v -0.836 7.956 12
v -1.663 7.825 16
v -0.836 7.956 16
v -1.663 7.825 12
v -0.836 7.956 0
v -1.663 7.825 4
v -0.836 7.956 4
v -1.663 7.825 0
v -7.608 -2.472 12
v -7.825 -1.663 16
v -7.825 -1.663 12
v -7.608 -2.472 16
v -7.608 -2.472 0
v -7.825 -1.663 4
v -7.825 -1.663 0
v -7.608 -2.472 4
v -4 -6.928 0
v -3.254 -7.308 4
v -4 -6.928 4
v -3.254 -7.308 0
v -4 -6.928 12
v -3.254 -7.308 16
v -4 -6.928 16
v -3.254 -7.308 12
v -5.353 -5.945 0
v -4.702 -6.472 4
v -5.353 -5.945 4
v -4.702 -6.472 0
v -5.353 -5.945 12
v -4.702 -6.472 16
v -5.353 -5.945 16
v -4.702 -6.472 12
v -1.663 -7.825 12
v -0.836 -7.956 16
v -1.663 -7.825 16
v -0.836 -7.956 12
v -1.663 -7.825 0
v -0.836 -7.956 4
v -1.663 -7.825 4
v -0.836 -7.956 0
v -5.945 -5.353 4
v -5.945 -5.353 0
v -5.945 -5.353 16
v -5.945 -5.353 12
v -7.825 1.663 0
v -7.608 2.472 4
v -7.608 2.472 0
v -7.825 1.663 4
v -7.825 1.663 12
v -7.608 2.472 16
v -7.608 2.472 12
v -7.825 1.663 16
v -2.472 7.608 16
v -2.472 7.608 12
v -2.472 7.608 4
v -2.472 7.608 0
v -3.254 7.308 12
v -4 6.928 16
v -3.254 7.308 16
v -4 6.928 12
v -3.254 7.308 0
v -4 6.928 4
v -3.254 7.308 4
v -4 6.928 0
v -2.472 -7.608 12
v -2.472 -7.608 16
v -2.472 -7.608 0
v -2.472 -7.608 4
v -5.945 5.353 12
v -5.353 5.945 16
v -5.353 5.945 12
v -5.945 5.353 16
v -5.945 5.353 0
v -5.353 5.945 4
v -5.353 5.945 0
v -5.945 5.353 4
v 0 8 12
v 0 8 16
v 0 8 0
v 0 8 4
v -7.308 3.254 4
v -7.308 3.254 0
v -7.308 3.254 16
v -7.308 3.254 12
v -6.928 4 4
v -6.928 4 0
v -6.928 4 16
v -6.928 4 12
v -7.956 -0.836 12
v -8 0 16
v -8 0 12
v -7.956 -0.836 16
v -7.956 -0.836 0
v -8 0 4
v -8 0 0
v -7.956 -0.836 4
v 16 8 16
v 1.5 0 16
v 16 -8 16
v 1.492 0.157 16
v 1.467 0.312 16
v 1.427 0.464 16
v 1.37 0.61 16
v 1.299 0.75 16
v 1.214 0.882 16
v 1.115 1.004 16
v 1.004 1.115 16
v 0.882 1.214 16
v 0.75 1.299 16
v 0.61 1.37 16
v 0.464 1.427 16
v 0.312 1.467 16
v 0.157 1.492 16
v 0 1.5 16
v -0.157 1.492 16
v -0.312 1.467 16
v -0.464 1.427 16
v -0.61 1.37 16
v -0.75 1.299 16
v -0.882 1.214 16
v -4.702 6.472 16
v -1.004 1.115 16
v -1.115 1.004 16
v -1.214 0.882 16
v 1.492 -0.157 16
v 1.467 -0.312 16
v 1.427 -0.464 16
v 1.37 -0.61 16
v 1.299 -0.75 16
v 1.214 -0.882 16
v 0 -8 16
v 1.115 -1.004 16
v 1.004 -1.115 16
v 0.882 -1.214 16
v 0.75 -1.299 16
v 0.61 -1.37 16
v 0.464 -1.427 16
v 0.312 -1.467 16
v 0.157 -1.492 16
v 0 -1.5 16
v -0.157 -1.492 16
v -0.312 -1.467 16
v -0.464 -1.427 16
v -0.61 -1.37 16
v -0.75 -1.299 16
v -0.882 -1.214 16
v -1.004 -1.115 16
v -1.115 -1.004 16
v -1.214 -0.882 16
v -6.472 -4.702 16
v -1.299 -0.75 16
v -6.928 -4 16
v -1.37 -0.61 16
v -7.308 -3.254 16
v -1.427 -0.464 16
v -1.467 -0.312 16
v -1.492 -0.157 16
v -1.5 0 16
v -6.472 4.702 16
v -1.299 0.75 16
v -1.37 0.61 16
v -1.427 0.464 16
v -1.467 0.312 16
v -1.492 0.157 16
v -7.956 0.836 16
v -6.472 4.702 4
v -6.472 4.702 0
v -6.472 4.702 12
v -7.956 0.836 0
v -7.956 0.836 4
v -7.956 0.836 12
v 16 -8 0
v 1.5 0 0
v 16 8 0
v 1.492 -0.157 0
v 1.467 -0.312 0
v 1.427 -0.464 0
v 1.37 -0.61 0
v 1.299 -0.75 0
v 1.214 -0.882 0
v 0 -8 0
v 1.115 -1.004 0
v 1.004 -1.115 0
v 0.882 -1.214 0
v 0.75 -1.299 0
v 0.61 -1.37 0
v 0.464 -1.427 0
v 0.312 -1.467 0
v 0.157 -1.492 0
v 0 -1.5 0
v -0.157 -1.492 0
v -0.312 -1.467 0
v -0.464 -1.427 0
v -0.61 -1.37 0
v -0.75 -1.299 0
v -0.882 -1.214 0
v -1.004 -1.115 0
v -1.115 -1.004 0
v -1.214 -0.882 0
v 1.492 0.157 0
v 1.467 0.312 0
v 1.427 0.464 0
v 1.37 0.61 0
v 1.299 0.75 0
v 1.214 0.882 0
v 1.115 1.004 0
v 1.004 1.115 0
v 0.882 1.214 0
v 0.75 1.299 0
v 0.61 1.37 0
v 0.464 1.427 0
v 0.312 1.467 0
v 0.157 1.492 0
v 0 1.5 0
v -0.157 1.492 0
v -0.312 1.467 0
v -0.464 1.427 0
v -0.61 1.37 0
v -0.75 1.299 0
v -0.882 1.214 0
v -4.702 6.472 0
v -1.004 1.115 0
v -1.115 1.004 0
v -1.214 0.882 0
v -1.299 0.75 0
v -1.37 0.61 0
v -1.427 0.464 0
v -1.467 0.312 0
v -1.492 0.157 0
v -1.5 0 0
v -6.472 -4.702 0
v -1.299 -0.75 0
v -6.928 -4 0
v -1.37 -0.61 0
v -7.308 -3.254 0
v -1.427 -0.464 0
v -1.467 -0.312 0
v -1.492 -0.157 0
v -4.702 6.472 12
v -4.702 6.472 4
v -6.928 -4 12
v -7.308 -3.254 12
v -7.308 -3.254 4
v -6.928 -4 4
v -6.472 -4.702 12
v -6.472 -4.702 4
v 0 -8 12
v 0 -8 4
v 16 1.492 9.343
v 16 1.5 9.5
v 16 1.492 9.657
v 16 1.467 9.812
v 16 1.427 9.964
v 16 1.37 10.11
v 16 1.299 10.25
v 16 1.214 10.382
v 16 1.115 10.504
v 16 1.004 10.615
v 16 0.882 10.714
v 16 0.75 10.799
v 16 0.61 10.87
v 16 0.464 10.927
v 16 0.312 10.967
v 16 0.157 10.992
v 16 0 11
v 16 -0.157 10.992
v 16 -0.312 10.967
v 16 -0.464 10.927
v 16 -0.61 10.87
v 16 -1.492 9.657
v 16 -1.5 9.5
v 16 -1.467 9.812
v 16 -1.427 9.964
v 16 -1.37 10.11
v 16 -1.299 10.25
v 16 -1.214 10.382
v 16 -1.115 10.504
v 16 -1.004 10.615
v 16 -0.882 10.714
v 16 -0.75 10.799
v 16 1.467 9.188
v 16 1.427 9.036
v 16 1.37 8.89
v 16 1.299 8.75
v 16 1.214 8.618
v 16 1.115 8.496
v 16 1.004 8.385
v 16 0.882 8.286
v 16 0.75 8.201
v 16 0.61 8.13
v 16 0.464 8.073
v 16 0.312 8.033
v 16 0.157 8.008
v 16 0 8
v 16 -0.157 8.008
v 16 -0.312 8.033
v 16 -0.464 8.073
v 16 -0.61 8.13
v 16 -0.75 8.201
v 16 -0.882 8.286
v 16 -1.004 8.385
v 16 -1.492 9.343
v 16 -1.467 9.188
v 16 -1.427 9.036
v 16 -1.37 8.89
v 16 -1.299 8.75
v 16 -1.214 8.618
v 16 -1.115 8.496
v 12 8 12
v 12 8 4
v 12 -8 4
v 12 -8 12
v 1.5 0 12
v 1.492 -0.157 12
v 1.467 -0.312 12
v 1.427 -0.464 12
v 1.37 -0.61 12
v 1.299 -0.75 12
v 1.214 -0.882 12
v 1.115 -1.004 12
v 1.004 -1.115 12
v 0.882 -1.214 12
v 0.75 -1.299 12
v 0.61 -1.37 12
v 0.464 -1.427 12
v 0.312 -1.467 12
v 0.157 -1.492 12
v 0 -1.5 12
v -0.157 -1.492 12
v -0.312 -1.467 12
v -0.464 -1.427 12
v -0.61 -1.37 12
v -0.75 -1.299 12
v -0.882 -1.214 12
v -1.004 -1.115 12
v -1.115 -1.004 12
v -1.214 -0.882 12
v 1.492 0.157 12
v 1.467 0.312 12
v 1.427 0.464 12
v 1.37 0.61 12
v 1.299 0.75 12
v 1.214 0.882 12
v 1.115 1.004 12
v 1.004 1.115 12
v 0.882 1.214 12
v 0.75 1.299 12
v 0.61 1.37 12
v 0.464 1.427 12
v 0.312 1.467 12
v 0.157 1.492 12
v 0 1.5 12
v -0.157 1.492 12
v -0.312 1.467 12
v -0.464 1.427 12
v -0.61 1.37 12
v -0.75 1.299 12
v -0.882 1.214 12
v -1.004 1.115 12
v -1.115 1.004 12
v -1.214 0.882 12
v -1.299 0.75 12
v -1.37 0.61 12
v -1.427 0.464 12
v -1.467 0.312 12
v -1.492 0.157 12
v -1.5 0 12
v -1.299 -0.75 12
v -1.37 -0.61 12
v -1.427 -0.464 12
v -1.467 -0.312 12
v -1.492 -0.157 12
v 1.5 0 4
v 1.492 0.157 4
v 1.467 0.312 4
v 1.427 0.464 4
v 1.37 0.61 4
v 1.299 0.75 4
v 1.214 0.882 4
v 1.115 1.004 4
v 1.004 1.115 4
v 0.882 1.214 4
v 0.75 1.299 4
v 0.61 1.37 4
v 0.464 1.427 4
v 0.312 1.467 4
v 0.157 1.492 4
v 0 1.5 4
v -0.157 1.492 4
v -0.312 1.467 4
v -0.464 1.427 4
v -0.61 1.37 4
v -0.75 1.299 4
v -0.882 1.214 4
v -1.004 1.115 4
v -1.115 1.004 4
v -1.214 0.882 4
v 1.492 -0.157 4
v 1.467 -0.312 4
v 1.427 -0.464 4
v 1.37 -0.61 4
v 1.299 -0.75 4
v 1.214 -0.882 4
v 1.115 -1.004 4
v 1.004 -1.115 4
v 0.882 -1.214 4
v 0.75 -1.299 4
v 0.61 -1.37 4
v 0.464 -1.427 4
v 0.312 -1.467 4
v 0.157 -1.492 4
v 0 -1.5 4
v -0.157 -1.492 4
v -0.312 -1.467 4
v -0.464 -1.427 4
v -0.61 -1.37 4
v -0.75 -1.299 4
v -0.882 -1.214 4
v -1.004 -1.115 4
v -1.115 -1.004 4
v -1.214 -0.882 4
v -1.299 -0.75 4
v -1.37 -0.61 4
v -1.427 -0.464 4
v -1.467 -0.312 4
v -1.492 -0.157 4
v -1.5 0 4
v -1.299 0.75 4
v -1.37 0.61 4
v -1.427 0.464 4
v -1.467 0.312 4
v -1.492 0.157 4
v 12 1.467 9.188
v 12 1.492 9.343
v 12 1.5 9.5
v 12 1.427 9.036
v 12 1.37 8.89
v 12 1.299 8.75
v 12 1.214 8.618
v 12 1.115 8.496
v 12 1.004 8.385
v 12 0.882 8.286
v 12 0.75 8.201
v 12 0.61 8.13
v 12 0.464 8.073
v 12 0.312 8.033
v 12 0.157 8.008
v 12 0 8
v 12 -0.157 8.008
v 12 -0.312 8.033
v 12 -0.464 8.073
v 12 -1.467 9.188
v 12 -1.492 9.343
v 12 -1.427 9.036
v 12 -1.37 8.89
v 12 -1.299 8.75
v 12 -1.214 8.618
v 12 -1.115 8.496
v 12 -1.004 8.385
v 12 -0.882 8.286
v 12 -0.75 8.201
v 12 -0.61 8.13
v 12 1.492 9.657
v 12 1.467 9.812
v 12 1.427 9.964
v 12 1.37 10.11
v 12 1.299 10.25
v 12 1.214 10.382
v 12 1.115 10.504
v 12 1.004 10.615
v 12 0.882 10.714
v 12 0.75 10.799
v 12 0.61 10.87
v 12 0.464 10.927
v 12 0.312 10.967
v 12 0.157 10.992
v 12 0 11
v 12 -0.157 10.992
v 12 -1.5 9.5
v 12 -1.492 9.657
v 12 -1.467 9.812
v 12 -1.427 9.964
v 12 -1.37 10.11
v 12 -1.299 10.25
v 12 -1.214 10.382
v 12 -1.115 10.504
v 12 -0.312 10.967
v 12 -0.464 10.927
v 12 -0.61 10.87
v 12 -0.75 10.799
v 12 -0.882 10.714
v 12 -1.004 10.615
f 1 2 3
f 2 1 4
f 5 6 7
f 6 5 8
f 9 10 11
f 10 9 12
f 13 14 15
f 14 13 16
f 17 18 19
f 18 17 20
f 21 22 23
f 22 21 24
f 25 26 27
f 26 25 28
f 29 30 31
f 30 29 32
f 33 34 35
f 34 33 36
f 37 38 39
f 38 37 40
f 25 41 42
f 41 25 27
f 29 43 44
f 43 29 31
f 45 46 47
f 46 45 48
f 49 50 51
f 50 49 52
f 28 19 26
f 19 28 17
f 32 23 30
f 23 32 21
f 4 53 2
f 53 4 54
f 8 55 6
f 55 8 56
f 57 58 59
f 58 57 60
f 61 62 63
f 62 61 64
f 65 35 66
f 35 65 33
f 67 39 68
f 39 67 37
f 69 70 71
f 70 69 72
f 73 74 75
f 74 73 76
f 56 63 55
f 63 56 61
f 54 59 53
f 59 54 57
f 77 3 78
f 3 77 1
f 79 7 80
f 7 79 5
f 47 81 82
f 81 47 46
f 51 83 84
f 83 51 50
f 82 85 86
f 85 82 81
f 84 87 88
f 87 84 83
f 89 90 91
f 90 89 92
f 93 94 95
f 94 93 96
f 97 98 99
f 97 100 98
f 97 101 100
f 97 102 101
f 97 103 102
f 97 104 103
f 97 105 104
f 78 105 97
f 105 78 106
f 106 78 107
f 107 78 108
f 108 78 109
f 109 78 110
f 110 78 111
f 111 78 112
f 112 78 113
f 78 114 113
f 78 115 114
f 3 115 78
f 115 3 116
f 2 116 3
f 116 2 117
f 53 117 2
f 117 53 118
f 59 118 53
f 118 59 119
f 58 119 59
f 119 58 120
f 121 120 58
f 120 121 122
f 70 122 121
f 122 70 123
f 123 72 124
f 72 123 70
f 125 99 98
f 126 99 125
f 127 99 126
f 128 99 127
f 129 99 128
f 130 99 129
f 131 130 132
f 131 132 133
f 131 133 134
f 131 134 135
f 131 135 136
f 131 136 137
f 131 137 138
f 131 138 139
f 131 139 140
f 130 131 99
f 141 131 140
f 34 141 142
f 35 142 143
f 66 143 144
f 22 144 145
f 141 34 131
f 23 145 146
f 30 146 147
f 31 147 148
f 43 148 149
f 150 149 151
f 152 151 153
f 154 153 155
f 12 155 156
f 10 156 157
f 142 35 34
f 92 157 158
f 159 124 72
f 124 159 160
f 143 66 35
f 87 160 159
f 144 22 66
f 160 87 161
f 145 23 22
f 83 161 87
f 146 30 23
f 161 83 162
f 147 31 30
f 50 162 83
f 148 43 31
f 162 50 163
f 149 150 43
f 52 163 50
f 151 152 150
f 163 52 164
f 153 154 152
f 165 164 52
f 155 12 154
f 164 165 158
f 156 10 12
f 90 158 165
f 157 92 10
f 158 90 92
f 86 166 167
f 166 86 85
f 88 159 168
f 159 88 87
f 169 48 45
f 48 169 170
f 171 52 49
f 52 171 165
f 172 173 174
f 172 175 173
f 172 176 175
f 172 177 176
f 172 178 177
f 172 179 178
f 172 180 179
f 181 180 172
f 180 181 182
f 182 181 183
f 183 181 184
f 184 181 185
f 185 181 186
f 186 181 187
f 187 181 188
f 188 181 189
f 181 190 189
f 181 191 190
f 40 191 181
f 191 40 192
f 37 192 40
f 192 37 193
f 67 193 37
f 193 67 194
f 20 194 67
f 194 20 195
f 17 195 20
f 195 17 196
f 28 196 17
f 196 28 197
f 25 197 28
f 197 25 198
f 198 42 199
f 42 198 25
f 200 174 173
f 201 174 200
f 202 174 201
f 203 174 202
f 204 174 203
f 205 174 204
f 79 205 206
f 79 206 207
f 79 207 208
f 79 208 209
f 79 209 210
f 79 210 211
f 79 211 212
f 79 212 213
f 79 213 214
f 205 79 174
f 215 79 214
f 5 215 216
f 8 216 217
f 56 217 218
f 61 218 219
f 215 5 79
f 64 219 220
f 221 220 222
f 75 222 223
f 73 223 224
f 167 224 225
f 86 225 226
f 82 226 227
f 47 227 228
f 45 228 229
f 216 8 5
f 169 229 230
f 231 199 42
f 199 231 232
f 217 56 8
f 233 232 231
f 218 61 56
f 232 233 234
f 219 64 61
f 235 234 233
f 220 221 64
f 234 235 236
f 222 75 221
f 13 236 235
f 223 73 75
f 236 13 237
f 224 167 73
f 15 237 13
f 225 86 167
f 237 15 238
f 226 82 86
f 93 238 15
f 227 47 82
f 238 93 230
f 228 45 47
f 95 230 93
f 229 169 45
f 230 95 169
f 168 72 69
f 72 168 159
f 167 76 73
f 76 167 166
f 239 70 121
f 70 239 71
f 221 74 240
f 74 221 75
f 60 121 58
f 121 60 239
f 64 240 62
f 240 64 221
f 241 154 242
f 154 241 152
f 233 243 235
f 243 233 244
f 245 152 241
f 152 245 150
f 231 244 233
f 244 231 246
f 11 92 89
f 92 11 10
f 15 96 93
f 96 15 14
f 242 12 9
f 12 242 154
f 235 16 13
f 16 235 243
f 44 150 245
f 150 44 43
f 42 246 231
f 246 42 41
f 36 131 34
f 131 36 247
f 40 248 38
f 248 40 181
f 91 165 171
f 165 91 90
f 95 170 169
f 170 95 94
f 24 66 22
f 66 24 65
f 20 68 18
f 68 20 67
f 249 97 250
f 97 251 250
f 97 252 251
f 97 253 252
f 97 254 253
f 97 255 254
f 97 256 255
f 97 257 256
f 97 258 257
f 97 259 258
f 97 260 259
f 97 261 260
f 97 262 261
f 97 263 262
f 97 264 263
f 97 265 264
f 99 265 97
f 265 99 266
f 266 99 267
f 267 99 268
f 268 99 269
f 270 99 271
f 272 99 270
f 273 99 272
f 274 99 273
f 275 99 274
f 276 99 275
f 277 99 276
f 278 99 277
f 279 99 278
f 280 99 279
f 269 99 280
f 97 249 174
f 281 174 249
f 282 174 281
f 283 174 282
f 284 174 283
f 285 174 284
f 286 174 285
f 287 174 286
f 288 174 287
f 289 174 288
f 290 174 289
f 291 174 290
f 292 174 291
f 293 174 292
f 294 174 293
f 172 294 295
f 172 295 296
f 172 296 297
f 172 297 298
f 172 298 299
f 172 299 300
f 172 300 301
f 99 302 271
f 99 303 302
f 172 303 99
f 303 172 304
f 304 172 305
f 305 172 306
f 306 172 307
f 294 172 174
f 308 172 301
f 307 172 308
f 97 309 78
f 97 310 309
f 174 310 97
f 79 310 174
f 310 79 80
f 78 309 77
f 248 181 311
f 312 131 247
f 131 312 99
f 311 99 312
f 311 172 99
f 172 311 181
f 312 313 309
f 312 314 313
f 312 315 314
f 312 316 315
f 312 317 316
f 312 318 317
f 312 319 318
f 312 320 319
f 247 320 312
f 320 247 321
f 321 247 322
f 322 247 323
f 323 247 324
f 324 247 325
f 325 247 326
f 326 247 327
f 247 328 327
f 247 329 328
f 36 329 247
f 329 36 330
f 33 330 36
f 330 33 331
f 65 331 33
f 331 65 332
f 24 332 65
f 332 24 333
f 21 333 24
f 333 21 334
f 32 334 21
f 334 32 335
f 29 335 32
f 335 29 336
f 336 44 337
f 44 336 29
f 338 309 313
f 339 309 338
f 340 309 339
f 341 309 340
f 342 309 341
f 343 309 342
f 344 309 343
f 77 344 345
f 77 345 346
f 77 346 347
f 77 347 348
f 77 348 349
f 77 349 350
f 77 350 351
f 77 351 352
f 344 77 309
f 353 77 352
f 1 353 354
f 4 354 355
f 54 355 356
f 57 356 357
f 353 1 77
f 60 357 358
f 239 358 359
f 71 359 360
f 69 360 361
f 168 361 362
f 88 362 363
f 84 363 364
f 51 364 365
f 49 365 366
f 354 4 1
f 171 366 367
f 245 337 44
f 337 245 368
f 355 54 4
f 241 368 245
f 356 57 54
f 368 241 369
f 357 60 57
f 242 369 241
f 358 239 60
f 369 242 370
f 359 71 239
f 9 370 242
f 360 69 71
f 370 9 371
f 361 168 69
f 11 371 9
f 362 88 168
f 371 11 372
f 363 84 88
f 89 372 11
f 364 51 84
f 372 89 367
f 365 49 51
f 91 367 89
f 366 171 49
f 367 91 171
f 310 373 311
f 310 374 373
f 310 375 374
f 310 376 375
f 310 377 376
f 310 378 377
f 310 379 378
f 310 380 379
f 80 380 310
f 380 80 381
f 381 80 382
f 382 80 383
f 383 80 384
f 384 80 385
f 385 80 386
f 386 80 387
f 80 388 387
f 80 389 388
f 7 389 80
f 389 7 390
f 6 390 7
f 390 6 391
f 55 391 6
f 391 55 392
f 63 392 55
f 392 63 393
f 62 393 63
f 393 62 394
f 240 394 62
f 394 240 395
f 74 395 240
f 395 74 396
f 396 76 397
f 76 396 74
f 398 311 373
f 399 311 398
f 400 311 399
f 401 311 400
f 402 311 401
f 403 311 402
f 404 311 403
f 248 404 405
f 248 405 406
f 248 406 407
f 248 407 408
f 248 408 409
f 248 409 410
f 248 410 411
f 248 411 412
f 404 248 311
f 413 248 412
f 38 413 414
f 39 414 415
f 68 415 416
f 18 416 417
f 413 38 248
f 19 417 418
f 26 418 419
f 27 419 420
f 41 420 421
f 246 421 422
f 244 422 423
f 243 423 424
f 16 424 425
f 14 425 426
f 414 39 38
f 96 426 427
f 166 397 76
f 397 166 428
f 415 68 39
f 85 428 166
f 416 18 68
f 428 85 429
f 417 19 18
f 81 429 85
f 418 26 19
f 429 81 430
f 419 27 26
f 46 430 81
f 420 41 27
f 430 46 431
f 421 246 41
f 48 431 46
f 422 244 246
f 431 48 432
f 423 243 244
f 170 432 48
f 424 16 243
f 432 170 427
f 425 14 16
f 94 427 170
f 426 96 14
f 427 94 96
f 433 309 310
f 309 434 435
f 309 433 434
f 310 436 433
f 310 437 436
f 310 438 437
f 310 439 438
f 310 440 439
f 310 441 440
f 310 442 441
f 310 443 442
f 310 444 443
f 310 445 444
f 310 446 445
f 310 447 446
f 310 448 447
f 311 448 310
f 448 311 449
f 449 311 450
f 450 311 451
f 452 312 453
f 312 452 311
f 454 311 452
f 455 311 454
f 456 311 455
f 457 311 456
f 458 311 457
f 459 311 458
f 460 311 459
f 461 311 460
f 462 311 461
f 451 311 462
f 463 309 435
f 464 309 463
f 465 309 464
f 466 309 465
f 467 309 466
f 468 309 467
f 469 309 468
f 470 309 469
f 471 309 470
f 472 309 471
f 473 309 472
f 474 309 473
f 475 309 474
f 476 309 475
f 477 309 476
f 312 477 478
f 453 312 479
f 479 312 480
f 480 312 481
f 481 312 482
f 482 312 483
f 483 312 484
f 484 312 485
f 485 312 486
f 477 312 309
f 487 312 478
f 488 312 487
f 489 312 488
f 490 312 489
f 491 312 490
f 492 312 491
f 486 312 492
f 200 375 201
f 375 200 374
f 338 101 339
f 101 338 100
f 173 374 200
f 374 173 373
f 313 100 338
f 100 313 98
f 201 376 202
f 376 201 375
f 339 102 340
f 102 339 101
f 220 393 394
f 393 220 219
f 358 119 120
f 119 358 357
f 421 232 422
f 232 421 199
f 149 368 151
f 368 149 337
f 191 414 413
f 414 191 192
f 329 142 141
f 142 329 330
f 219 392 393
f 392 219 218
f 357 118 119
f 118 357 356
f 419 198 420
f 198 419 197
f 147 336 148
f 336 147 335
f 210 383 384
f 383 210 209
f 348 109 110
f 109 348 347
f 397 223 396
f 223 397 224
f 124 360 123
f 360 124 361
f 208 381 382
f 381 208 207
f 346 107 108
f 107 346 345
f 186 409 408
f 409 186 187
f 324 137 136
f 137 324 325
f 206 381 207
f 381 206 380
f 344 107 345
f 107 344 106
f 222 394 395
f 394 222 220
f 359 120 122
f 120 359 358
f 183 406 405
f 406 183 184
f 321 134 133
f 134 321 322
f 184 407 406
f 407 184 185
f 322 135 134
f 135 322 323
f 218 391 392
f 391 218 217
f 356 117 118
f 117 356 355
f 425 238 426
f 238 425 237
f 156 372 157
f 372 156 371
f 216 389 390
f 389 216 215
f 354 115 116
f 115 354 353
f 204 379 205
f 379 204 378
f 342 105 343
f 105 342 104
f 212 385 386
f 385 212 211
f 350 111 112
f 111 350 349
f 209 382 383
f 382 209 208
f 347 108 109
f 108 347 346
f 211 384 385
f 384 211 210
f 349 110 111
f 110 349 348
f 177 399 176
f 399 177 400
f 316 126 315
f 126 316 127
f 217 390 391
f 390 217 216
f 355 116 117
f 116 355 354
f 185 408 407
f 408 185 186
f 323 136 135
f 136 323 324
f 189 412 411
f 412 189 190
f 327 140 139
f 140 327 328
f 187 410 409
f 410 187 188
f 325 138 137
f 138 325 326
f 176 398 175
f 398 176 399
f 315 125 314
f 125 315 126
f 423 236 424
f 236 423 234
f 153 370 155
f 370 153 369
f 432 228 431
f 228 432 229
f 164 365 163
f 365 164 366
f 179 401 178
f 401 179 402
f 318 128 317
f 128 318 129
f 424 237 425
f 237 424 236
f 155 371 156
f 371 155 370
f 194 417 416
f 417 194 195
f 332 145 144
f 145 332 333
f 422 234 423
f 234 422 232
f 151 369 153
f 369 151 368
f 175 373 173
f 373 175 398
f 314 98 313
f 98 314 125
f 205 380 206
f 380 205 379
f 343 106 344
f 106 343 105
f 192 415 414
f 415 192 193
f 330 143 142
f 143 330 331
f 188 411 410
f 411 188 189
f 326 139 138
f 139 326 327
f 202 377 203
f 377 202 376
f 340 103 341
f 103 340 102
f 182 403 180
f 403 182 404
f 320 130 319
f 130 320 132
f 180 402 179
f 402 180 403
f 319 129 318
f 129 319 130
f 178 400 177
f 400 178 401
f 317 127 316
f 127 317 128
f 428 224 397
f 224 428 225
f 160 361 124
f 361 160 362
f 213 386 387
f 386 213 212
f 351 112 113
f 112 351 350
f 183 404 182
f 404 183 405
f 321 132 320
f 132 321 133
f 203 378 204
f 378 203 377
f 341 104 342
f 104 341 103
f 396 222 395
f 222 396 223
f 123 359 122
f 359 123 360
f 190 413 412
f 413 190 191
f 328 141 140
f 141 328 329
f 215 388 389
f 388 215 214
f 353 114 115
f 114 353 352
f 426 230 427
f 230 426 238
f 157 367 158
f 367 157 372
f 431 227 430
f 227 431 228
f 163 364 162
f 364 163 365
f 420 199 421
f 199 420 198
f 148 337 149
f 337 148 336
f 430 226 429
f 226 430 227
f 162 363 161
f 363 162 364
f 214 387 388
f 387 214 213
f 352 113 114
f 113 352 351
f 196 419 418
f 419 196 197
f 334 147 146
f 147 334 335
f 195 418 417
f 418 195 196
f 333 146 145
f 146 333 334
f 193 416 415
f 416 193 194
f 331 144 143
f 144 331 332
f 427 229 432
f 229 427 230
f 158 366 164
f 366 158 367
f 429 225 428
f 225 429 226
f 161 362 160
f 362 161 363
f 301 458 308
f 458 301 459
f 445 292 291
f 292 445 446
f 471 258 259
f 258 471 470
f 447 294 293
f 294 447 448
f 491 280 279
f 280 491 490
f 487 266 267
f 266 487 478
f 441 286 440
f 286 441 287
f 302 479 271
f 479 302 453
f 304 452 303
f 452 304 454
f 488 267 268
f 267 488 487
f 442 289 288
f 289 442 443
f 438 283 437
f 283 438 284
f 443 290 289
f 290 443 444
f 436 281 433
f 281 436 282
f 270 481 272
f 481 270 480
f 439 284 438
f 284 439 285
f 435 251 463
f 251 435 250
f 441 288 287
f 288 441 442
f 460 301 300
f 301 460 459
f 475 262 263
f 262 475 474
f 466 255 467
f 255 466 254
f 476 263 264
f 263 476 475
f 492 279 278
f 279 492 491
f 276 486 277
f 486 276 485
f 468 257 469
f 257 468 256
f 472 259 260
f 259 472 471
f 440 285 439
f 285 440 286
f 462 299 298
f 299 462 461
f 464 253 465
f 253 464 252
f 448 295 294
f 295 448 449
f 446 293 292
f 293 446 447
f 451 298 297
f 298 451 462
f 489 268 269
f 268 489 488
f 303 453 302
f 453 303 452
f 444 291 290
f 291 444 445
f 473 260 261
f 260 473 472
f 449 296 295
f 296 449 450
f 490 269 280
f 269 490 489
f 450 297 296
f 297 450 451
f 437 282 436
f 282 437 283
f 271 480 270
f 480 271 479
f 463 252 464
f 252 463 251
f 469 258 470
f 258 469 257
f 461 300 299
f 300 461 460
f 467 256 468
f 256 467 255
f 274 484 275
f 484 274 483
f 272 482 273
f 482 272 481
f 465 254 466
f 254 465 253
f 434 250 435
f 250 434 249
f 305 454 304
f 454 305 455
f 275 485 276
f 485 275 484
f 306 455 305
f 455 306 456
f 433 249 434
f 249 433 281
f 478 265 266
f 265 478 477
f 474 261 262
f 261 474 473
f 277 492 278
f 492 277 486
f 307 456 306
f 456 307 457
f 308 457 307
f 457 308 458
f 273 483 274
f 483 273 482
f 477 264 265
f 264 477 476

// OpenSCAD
$fn=60;

difference(){
union(){
cylinder(d=16,h=16);
translate([0,-8,0])cube(16);
}
translate([0,0,4])cylinder(d=16,h=8);
translate([-4,-8,4])cube([16,16,8]);
cylinder(d=3,h=20);
translate([0,0,9.5])rotate([0,90,0])
cylinder(d=3,h=20);
}
